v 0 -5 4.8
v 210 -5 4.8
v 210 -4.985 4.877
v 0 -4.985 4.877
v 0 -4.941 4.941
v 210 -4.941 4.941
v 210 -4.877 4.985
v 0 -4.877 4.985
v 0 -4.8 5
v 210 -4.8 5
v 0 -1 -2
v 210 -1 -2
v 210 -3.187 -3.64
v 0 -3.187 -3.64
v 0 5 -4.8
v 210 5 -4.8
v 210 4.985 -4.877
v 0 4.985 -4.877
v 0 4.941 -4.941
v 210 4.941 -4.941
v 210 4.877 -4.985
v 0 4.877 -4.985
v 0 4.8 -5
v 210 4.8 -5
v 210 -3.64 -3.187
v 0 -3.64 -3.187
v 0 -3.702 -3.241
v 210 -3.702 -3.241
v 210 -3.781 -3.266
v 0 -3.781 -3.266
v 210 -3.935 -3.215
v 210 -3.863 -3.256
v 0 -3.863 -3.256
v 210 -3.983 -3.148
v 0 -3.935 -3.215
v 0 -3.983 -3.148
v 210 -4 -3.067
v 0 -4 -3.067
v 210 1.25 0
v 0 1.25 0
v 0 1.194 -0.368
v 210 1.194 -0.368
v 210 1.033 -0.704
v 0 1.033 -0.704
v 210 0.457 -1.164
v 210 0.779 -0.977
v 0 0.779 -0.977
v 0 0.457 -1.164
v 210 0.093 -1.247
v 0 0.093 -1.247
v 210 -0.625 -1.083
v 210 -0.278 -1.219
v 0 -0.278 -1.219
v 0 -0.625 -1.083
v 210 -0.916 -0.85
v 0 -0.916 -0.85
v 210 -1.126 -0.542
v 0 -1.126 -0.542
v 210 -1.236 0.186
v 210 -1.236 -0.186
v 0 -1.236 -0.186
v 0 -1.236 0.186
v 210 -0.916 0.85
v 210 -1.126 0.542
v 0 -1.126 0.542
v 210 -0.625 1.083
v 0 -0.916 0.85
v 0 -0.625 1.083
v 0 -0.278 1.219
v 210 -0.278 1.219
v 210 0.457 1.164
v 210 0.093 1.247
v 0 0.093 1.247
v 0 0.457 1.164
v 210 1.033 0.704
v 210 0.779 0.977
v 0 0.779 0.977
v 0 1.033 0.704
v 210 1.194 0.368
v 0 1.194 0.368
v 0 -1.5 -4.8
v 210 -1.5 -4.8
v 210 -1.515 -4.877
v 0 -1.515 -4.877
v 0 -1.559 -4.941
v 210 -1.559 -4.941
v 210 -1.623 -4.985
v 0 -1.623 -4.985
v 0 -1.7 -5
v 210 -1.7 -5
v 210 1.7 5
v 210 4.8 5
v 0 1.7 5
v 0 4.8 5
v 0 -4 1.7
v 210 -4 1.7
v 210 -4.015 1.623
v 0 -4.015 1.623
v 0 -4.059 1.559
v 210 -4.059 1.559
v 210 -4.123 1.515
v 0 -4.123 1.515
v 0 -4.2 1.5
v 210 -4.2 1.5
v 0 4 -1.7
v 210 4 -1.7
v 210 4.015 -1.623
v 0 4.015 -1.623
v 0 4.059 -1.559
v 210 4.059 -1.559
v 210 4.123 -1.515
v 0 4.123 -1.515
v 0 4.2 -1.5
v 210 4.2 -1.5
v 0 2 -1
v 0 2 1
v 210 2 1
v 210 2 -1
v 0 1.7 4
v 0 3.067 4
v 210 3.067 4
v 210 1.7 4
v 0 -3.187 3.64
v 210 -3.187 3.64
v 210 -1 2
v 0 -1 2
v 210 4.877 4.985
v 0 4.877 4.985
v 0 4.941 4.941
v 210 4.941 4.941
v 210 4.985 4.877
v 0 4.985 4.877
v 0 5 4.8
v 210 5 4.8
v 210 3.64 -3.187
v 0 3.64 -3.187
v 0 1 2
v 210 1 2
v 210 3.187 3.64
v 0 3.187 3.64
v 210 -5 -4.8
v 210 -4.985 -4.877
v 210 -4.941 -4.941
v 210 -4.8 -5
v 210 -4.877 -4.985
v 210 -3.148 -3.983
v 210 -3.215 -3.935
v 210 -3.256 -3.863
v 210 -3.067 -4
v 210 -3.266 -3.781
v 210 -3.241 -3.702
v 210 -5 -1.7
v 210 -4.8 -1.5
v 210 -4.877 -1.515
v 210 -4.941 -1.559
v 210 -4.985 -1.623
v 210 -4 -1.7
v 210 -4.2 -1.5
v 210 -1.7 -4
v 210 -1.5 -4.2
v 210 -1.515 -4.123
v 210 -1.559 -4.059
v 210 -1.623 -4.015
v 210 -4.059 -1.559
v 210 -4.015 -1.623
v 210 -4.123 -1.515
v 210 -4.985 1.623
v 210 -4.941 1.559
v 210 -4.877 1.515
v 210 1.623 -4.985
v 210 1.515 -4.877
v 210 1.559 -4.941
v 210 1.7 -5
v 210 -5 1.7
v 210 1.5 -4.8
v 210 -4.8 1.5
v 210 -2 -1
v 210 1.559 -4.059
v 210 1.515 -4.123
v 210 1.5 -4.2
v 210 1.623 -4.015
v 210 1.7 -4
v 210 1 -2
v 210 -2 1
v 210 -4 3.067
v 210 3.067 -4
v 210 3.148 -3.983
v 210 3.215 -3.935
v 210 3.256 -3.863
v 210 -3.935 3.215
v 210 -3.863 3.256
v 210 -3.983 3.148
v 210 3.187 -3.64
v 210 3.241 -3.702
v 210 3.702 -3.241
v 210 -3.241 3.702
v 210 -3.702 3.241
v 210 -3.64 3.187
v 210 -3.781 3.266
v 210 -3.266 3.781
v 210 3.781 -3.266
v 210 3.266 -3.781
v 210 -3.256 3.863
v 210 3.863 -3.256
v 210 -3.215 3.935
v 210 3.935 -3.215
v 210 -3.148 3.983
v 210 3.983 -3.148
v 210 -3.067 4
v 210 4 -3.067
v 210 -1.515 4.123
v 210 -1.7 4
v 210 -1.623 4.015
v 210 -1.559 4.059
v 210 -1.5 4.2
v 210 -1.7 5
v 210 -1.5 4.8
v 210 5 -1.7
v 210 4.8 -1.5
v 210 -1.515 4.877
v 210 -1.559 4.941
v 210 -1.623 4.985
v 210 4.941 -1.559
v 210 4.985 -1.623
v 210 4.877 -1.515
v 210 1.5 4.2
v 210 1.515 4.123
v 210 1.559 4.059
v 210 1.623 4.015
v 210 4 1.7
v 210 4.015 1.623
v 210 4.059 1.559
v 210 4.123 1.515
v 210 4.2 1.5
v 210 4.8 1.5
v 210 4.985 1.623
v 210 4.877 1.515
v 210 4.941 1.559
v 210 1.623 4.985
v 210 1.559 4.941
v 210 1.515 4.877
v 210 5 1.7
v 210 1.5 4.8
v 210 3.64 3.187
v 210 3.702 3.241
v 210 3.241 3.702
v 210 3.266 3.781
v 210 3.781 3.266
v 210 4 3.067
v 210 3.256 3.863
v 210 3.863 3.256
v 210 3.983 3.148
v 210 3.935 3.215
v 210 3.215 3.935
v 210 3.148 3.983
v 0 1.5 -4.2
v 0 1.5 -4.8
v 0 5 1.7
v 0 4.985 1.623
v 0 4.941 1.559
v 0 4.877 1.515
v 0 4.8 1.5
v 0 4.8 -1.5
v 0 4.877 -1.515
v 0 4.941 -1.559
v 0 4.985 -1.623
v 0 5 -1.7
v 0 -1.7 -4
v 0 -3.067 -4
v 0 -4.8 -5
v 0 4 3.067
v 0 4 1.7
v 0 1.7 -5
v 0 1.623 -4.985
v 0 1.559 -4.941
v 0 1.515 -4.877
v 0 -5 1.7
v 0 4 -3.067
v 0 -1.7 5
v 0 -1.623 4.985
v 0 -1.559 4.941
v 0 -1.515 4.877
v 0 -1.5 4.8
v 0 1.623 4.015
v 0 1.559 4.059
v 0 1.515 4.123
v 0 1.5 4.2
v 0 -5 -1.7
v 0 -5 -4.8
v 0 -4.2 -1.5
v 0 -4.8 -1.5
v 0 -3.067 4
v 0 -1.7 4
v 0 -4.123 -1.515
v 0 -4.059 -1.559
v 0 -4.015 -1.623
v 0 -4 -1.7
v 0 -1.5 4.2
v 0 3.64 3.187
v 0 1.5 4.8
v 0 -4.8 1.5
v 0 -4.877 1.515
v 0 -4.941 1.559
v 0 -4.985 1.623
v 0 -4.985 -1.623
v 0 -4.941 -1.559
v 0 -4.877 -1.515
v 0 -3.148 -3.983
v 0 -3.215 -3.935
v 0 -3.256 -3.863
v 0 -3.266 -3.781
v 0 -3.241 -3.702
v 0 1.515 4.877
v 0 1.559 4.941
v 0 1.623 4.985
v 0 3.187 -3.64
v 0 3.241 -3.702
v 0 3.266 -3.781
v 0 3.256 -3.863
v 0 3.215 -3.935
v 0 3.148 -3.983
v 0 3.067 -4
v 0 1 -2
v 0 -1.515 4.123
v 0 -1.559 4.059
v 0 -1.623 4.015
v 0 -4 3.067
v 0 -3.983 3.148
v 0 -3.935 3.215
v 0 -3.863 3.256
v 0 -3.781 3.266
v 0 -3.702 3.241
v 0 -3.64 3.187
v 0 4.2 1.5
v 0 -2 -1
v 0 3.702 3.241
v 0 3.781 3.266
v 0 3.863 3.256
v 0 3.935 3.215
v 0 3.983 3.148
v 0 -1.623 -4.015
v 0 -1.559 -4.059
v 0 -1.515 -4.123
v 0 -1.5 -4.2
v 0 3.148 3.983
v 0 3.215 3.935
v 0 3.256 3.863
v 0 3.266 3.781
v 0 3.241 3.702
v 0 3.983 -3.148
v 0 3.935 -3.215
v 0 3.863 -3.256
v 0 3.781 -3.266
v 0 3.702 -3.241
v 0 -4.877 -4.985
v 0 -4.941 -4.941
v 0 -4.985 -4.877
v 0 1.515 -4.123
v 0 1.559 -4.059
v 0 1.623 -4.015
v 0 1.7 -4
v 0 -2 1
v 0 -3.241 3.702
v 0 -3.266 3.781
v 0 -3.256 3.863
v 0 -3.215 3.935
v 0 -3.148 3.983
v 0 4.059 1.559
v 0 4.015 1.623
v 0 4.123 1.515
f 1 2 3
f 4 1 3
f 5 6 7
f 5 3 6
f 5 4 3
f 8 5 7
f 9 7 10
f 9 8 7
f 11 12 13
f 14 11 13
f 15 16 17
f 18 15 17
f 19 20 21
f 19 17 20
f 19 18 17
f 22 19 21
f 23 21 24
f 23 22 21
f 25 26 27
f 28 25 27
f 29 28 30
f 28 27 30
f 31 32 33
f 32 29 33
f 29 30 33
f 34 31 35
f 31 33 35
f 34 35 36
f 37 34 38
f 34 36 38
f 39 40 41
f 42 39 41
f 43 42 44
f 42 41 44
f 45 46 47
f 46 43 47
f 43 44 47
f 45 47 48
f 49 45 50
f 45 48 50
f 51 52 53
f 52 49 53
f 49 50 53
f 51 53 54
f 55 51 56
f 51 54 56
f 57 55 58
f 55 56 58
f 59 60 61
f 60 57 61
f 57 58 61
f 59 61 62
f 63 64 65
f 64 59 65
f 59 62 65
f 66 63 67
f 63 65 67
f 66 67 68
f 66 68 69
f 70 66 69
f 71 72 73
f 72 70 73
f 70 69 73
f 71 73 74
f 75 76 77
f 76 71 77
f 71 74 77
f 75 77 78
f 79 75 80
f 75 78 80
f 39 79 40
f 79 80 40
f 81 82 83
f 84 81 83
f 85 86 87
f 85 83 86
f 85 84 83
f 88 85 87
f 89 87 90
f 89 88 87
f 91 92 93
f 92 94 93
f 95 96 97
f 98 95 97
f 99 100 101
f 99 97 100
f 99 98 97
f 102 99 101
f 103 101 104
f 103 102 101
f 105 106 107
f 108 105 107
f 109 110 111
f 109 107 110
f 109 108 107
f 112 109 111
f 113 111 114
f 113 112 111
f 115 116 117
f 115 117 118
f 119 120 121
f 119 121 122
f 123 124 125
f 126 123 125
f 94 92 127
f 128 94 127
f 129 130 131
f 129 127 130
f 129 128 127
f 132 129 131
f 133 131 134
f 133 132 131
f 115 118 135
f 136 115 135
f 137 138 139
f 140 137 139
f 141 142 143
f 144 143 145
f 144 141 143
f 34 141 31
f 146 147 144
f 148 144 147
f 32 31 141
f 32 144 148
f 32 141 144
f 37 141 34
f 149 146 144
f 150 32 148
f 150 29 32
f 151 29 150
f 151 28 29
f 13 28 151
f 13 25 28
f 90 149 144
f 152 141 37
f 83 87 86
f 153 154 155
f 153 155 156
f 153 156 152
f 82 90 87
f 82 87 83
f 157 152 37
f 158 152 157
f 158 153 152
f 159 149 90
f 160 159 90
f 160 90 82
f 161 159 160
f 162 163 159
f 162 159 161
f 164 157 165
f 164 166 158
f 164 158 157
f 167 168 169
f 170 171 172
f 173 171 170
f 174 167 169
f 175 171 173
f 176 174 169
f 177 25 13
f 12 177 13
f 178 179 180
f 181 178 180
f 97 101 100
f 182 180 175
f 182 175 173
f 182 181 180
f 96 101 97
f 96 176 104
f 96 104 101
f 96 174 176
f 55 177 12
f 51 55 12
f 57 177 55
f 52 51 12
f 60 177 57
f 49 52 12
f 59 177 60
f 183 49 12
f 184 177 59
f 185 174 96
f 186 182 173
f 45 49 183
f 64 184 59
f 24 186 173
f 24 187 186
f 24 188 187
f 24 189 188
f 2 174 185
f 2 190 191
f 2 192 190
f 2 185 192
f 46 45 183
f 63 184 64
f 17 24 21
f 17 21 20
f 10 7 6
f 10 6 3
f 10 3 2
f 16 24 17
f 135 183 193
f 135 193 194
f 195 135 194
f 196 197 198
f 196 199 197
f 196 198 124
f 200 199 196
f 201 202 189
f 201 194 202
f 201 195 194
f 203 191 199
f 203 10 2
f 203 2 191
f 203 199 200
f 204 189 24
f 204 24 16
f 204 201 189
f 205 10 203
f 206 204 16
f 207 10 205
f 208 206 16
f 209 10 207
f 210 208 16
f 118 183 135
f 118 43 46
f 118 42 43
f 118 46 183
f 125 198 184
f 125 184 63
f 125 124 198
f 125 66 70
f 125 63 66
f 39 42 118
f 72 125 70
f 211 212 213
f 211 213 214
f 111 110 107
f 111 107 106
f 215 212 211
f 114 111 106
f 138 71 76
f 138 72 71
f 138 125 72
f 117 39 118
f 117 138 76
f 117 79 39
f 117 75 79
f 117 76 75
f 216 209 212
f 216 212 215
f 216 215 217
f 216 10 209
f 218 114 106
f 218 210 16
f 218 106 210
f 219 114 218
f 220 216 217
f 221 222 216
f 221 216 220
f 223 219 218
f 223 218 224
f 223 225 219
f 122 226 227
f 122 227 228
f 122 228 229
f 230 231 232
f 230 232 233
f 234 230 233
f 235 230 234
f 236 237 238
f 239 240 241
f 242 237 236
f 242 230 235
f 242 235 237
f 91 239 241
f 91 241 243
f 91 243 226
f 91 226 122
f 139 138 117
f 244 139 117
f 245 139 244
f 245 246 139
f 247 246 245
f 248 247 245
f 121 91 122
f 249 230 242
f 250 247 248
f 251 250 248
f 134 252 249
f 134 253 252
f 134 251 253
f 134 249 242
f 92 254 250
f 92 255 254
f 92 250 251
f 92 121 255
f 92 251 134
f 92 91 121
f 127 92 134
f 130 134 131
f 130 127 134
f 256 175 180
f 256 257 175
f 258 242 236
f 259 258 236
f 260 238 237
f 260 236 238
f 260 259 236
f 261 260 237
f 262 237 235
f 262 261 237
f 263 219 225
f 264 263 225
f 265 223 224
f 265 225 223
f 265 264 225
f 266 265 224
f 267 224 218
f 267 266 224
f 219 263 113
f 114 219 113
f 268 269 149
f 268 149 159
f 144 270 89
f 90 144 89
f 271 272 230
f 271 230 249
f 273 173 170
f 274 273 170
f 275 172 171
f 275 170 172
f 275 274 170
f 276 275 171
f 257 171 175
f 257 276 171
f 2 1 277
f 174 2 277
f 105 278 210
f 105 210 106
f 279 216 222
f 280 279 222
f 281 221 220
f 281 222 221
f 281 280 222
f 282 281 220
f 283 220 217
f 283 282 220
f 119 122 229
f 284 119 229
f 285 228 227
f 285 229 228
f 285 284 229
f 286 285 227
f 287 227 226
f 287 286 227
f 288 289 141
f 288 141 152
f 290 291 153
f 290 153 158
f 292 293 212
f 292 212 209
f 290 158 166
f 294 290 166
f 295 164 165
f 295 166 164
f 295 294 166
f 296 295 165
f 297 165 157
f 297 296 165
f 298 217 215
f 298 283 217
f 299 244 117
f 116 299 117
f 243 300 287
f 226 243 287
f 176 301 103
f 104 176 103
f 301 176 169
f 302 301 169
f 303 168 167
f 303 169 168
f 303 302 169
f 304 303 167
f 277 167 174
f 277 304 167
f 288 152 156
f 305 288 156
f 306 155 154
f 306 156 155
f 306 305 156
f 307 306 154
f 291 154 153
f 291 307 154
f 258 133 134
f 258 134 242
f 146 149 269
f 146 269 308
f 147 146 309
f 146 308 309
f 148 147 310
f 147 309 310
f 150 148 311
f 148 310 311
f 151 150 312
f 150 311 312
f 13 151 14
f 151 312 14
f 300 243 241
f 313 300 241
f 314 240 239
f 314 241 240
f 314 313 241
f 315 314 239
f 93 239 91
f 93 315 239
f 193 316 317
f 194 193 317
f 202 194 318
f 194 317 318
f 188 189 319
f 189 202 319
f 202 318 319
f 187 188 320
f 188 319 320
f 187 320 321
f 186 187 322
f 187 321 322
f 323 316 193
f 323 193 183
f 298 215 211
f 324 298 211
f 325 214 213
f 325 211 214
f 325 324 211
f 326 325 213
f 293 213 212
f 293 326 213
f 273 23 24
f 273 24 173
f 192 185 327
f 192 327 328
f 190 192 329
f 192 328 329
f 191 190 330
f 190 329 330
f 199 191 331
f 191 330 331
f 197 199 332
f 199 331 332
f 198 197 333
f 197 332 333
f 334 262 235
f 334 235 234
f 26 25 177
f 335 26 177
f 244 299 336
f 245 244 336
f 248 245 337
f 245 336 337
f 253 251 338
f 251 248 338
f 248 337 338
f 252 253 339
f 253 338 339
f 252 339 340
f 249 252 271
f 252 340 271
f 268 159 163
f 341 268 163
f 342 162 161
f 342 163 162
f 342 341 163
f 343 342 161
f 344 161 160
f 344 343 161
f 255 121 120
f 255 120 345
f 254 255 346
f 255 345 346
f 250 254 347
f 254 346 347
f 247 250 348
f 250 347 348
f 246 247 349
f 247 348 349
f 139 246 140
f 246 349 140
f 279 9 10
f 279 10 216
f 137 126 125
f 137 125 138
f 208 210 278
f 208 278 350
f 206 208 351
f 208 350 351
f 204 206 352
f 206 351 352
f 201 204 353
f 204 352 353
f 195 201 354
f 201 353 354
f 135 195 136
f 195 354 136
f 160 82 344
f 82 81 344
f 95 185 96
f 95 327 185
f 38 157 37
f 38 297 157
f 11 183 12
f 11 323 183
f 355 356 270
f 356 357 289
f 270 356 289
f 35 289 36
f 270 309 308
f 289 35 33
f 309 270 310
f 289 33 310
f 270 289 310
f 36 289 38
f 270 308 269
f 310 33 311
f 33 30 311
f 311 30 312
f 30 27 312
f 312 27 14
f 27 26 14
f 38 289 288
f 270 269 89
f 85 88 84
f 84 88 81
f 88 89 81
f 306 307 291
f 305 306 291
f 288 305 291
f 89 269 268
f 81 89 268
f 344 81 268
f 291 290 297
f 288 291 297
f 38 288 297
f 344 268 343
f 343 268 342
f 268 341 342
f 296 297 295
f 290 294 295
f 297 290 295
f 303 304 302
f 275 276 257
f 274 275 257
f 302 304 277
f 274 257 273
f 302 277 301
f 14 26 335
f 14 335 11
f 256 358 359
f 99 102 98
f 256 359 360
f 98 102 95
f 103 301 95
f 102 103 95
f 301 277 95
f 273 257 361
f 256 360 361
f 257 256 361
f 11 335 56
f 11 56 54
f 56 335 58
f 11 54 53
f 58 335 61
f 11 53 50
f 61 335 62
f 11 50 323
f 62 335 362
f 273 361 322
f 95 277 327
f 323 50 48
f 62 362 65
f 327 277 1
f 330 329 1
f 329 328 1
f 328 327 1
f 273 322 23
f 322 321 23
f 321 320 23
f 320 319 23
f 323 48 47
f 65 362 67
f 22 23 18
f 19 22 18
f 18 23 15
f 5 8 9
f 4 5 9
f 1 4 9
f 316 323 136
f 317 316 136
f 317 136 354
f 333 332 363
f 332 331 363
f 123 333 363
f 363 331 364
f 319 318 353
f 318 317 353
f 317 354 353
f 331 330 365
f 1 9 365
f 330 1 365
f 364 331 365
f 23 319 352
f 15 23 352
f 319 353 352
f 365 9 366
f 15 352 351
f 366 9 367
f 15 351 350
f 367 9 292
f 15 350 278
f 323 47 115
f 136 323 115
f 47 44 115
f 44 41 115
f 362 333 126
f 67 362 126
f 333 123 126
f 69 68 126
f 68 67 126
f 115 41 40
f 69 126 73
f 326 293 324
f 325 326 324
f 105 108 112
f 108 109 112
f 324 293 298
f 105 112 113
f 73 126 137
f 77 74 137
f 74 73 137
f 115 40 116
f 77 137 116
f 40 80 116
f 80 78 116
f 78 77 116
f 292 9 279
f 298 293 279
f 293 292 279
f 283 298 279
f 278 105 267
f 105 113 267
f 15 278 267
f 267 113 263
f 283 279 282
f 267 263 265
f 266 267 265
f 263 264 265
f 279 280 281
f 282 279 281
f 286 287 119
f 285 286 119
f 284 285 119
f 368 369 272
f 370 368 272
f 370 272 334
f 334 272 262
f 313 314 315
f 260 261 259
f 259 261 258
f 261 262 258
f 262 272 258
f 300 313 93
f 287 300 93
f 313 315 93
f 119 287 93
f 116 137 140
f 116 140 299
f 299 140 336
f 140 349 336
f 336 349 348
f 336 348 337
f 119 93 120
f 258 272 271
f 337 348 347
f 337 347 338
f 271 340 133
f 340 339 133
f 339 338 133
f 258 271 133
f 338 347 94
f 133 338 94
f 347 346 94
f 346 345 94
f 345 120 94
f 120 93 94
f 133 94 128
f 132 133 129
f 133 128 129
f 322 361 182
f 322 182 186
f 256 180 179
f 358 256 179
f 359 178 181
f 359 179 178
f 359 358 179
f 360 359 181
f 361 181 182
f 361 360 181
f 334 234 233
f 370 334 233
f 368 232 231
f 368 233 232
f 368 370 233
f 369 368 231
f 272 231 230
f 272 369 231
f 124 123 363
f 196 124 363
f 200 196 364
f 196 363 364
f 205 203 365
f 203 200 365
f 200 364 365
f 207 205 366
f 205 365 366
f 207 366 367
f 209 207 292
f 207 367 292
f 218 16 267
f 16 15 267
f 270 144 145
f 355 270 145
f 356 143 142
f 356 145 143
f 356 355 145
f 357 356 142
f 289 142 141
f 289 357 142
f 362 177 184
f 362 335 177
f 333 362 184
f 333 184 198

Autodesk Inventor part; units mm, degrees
ref_plane "YZ Plane" through (0, 0, 0) normal (1, 0, 0) x (0, 1, 0)
ref_plane "XZ Plane" through (0, 0, 0) normal (0, 1, 0) x (-1, 0, 0)
ref_plane "XY Plane" through (0, 0, 0) normal (0, 0, 1) x (1, 0, 0)
sketch "Esquisse1" plane through (0, 0, 0) normal (1, 0, 0) x (0, 1, 0)
  line L0 (-5, -5) -> (5, 5) construction
  line L1 (5, -5) -> (-5, 5) construction
  circle A0 centre (0, 0) radius 1.25
  line L2 (2, 1) -> (2, -1)
  line L3 (-1, 2) -> (1, 2)
  line L4 (-2, -1) -> (-2, 1)
  line L5 (1, -2) -> (-1, -2)
  line L6 (4.8, -5) -> (1.7, -5)
  line L7 (5, -4.8) -> (5, -1.7)
  line L8 (1.5, -4.8) -> (1.5, -4.2)
  line L9 (12.6837, 0) -> (-8.9006, 0) construction
  line L10 (1.5, -4) -> (4, -4) construction
  line L11 (4, -4) -> (4, -1.5) construction
  line L12 (4, -1.5) -> (5, -1.5) construction
  line L13 (5, -5) -> (2, -1) construction
  line L14 (2, -1) -> (4, -3.6667) construction
  line L15 (2, -1) -> (4, -3.6667) construction
  line L16 (4, -3.0667) -> (4, -1.7)
  line L17 (4.8, -1.5) -> (4.2, -1.5)
  line L18 (1, -2) -> (5, -5) construction
  line L19 (1.7, -4) -> (3.0667, -4)
  line L20 (3.1867, -3.64) -> (1, -2)
  line L21 (2, -1) -> (3.64, -3.1867)
  arc A1 (5, -1.7) -> (4.8, -1.5) centre (4.8, -1.7) ccw
  arc A2 (4.2, -1.5) -> (4, -1.7) centre (4.2, -1.7) ccw
  arc A3 (4.8, -5) -> (5, -4.8) centre (4.8, -4.8) ccw
  arc A4 (1.5, -4.8) -> (1.7, -5) centre (1.7, -4.8) ccw
  arc A5 (1.7, -4) -> (1.5, -4.2) centre (1.7, -4.2) ccw
  arc A6 (3.0667, -4) -> (3.1867, -3.64) centre (3.0667, -3.8) ccw
  arc A7 (3.64, -3.1867) -> (4, -3.0667) centre (3.8, -3.0667) ccw
  arc A8 (3.1867, 3.64) -> (3.0667, 4) centre (3.0667, 3.8) ccw
  line L22 (1.5, 4.8) -> (1.5, 4.2)
  line L23 (1.5, 4) -> (1.5, 5) construction
  arc A9 (4, 3.0667) -> (3.64, 3.1867) centre (3.8, 3.0667) ccw
  line L24 (3.0667, 4) -> (1.7, 4)
  arc A10 (1.5, 4.2) -> (1.7, 4) centre (1.7, 4.2) ccw
  line L25 (4, 1.7) -> (4, 3.0667)
  line L26 (4, 4) -> (1.5, 4) construction
  line L27 (1, 2) -> (3.1867, 3.64)
  line L28 (4.8, 1.5) -> (4.2, 1.5)
  line L29 (1, 2) -> (3.6667, 4) construction
  line L30 (1, 2) -> (3.6667, 4) construction
  line L31 (4.8, 5) -> (1.7, 5)
  line L32 (3.64, 3.1867) -> (2, 1)
  line L33 (5, 4.8) -> (5, 1.7)
  line L34 (5, 5) -> (1, 2) construction
  line L35 (2, 1) -> (5, 5) construction
  line L36 (4, 1.5) -> (4, 4) construction
  circle A11 centre (0, 0) radius 1.25
  line L37 (-1, 2) -> (1, 2)
  line L38 (-2, -1) -> (-2, 1)
  line L39 (1, -2) -> (-1, -2)
  line L40 (2, 1) -> (2, -1)
  arc A12 (1.7, 5) -> (1.5, 4.8) centre (1.7, 4.8) ccw
  arc A13 (5, 4.8) -> (4.8, 5) centre (4.8, 4.8) ccw
  arc A14 (4, 1.7) -> (4.2, 1.5) centre (4.2, 1.7) ccw
  arc A15 (4.8, 1.5) -> (5, 1.7) centre (4.8, 1.7) ccw
  arc A16 (-3.64, 3.1867) -> (-4, 3.0667) centre (-3.8, 3.0667) ccw
  line L41 (-4.8, 1.5) -> (-4.2, 1.5)
  line L42 (-4, 1.5) -> (-5, 1.5) construction
  arc A17 (-3.0667, 4) -> (-3.1867, 3.64) centre (-3.0667, 3.8) ccw
  line L43 (-4, 3.0667) -> (-4, 1.7)
  arc A18 (-4.2, 1.5) -> (-4, 1.7) centre (-4.2, 1.7) ccw
  line L44 (-1.7, 4) -> (-3.0667, 4)
  line L45 (-4, 4) -> (-4, 1.5) construction
  line L46 (-2, 1) -> (-3.64, 3.1867)
  line L47 (-1.5, 4.8) -> (-1.5, 4.2)
  line L48 (-2, 1) -> (-4, 3.6667) construction
  line L49 (-2, 1) -> (-4, 3.6667) construction
  line L50 (-5, 4.8) -> (-5, 1.7)
  line L51 (-3.1867, 3.64) -> (-1, 2)
  line L52 (-4.8, 5) -> (-1.7, 5)
  line L53 (-5, 5) -> (-2, 1) construction
  line L54 (-1, 2) -> (-5, 5) construction
  line L55 (-1.5, 4) -> (-4, 4) construction
  circle A19 centre (0, 0) radius 1.25
  line L56 (-2, -1) -> (-2, 1)
  line L57 (1, -2) -> (-1, -2)
  line L58 (2, 1) -> (2, -1)
  line L59 (-1, 2) -> (1, 2)
  arc A20 (-5, 1.7) -> (-4.8, 1.5) centre (-4.8, 1.7) ccw
  arc A21 (-4.8, 5) -> (-5, 4.8) centre (-4.8, 4.8) ccw
  arc A22 (-1.7, 4) -> (-1.5, 4.2) centre (-1.7, 4.2) ccw
  arc A23 (-1.5, 4.8) -> (-1.7, 5) centre (-1.7, 4.8) ccw
  arc A24 (-3.1867, -3.64) -> (-3.0667, -4) centre (-3.0667, -3.8) ccw
  line L60 (-1.5, -4.8) -> (-1.5, -4.2)
  line L61 (-1.5, -4) -> (-1.5, -5) construction
  arc A25 (-4, -3.0667) -> (-3.64, -3.1867) centre (-3.8, -3.0667) ccw
  line L62 (-3.0667, -4) -> (-1.7, -4)
  arc A26 (-1.5, -4.2) -> (-1.7, -4) centre (-1.7, -4.2) ccw
  line L63 (-4, -1.7) -> (-4, -3.0667)
  line L64 (-4, -4) -> (-1.5, -4) construction
  line L65 (-1, -2) -> (-3.1867, -3.64)
  line L66 (-4.8, -1.5) -> (-4.2, -1.5)
  line L67 (-1, -2) -> (-3.6667, -4) construction
  line L68 (-1, -2) -> (-3.6667, -4) construction
  line L69 (-4.8, -5) -> (-1.7, -5)
  line L70 (-3.64, -3.1867) -> (-2, -1)
  line L71 (-5, -4.8) -> (-5, -1.7)
  line L72 (-5, -5) -> (-1, -2) construction
  line L73 (-2, -1) -> (-5, -5) construction
  line L74 (-4, -1.5) -> (-4, -4) construction
  circle A27 centre (0, 0) radius 1.25
  line L75 (1, -2) -> (-1, -2)
  line L76 (2, 1) -> (2, -1)
  line L77 (-1, 2) -> (1, 2)
  line L78 (-2, -1) -> (-2, 1)
  arc A28 (-1.7, -5) -> (-1.5, -4.8) centre (-1.7, -4.8) ccw
  arc A29 (-5, -4.8) -> (-4.8, -5) centre (-4.8, -4.8) ccw
  arc A30 (-4, -1.7) -> (-4.2, -1.5) centre (-4.2, -1.7) ccw
  arc A31 (-4.8, -1.5) -> (-5, -1.7) centre (-4.8, -1.7) ccw
  point P0 (2, 0)
  point P1 (0, 2)
  point P2 (-2, 0)
  point P3 (0, -2)
  point P4 (1.5, -5)
  point P5 (3.6667, -4)
  point P6 (4, 3.6667)
  point P7 (5, 1.5)
  point P8 (0, 2)
  point P9 (-2, 0)
  point P10 (0, -2)
  point P11 (2, 0)
  point P12 (-3.6667, 4)
  point P13 (-1.5, 5)
  point P14 (-2, 0)
  point P15 (0, -2)
  point P16 (2, 0)
  point P17 (0, 2)
  point P18 (-4, -3.6667)
  point P19 (-5, -1.5)
  point P20 (0, -2)
  point P21 (2, 0)
  point P22 (0, 2)
  point P23 (-2, 0)
  dimension "d0" = 10
  dimension "d1" = 10
  dimension "d19" = 2.5
  dimension "d30" = 2
  dimension "d36" = 360
  dimension "d39" = 3.5
  dimension "d40" = 3.5
  dimension "d41" = 1
  dimension "d50" = 0.2
  dimension "d60" = 0.2
  dimension "d61" = 0.2
  dimension "d62" = 0.2
  dimension "d63" = 0.2
  dimension "d64" = 0.2
  dimension "d73" = 0.2
  dimension "d80" = 360
extrude "Extrusion1" add sketch "Esquisse1" along normal blind 210
properties part number "profile210"
